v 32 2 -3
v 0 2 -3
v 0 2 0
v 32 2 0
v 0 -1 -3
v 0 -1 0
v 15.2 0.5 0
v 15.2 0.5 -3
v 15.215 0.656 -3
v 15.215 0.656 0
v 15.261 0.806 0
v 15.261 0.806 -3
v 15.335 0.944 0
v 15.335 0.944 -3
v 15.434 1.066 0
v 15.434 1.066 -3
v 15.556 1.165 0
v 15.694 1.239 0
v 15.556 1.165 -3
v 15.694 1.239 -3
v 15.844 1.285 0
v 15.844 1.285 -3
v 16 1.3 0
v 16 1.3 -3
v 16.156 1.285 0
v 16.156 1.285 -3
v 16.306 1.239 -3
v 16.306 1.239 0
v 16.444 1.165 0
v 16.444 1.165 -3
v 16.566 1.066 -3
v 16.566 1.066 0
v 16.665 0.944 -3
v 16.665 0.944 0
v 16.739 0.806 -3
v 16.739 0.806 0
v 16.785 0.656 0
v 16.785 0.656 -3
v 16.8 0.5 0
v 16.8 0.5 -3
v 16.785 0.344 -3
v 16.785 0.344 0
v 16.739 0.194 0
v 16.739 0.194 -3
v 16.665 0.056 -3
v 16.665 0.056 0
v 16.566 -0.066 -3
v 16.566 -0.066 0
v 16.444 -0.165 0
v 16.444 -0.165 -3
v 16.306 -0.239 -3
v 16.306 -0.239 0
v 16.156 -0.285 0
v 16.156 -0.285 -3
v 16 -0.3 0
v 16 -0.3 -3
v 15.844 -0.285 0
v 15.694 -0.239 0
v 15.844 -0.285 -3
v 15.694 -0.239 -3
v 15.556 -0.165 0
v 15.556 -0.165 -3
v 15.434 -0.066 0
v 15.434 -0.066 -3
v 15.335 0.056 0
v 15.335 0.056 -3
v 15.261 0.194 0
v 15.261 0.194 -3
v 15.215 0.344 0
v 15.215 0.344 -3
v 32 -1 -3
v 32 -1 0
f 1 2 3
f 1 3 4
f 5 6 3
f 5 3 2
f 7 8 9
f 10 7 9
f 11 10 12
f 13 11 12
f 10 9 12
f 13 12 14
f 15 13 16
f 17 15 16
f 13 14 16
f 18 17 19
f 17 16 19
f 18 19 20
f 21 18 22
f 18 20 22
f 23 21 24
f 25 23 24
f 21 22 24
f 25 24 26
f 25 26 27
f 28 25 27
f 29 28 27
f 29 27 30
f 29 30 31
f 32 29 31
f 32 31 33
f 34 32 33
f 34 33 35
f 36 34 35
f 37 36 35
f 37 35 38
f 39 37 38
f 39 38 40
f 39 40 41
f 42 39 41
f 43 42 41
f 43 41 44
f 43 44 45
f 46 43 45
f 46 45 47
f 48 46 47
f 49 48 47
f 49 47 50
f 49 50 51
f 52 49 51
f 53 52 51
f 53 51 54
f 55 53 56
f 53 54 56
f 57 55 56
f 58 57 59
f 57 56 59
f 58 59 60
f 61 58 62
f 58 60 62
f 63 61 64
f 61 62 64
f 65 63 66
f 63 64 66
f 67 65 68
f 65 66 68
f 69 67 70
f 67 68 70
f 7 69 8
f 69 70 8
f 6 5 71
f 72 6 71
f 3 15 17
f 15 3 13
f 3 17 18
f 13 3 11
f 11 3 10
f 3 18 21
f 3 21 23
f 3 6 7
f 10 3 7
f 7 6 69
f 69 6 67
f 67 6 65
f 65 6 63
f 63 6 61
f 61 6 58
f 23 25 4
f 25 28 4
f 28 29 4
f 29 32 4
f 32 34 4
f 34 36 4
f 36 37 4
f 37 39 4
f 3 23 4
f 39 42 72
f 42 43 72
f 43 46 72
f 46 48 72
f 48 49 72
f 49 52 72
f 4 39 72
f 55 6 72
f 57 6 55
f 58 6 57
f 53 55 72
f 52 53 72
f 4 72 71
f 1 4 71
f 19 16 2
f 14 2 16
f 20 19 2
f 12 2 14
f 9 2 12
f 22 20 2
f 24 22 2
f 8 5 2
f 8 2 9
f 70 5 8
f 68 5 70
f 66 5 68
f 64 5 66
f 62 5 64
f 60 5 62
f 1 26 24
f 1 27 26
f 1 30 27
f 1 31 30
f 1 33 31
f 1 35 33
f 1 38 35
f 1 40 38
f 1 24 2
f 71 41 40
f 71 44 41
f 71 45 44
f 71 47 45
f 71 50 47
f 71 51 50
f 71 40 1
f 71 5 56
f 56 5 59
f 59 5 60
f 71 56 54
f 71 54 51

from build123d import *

# Parameters (mm, degrees)
BOSS_EXTRU_1_DEPTH      = 2
BOSS_EXTRU_1_DEPTH_BACK = 1
ESQUISSE1_W             = 32
ESQUISSE1_H             = 3
D_GAGEMENT_M1_61_D      = 1.6


with BuildPart() as part:
    # Esquisse1 → Boss.-Extru.1 (new, two sides: drawn at the far end of the back side and taken through both)
    with BuildSketch(Plane(origin=(0, 0, 0), x_dir=(1, 0, 0), z_dir=(0, 1, 0)).offset(-BOSS_EXTRU_1_DEPTH_BACK)):
        with Locations((16, 1.5)):
            Rectangle(ESQUISSE1_W, ESQUISSE1_H)
    extrude(amount=BOSS_EXTRU_1_DEPTH + BOSS_EXTRU_1_DEPTH_BACK)

    # Dégagement M1.61 (through all)
    with Locations(Plane(origin=(16, 0.5, 0), x_dir=(1, 0, 0), z_dir=(0, 0, 1))):
        with Locations((0, 0)):
            Hole(D_GAGEMENT_M1_61_D / 2)


solid = part.part
